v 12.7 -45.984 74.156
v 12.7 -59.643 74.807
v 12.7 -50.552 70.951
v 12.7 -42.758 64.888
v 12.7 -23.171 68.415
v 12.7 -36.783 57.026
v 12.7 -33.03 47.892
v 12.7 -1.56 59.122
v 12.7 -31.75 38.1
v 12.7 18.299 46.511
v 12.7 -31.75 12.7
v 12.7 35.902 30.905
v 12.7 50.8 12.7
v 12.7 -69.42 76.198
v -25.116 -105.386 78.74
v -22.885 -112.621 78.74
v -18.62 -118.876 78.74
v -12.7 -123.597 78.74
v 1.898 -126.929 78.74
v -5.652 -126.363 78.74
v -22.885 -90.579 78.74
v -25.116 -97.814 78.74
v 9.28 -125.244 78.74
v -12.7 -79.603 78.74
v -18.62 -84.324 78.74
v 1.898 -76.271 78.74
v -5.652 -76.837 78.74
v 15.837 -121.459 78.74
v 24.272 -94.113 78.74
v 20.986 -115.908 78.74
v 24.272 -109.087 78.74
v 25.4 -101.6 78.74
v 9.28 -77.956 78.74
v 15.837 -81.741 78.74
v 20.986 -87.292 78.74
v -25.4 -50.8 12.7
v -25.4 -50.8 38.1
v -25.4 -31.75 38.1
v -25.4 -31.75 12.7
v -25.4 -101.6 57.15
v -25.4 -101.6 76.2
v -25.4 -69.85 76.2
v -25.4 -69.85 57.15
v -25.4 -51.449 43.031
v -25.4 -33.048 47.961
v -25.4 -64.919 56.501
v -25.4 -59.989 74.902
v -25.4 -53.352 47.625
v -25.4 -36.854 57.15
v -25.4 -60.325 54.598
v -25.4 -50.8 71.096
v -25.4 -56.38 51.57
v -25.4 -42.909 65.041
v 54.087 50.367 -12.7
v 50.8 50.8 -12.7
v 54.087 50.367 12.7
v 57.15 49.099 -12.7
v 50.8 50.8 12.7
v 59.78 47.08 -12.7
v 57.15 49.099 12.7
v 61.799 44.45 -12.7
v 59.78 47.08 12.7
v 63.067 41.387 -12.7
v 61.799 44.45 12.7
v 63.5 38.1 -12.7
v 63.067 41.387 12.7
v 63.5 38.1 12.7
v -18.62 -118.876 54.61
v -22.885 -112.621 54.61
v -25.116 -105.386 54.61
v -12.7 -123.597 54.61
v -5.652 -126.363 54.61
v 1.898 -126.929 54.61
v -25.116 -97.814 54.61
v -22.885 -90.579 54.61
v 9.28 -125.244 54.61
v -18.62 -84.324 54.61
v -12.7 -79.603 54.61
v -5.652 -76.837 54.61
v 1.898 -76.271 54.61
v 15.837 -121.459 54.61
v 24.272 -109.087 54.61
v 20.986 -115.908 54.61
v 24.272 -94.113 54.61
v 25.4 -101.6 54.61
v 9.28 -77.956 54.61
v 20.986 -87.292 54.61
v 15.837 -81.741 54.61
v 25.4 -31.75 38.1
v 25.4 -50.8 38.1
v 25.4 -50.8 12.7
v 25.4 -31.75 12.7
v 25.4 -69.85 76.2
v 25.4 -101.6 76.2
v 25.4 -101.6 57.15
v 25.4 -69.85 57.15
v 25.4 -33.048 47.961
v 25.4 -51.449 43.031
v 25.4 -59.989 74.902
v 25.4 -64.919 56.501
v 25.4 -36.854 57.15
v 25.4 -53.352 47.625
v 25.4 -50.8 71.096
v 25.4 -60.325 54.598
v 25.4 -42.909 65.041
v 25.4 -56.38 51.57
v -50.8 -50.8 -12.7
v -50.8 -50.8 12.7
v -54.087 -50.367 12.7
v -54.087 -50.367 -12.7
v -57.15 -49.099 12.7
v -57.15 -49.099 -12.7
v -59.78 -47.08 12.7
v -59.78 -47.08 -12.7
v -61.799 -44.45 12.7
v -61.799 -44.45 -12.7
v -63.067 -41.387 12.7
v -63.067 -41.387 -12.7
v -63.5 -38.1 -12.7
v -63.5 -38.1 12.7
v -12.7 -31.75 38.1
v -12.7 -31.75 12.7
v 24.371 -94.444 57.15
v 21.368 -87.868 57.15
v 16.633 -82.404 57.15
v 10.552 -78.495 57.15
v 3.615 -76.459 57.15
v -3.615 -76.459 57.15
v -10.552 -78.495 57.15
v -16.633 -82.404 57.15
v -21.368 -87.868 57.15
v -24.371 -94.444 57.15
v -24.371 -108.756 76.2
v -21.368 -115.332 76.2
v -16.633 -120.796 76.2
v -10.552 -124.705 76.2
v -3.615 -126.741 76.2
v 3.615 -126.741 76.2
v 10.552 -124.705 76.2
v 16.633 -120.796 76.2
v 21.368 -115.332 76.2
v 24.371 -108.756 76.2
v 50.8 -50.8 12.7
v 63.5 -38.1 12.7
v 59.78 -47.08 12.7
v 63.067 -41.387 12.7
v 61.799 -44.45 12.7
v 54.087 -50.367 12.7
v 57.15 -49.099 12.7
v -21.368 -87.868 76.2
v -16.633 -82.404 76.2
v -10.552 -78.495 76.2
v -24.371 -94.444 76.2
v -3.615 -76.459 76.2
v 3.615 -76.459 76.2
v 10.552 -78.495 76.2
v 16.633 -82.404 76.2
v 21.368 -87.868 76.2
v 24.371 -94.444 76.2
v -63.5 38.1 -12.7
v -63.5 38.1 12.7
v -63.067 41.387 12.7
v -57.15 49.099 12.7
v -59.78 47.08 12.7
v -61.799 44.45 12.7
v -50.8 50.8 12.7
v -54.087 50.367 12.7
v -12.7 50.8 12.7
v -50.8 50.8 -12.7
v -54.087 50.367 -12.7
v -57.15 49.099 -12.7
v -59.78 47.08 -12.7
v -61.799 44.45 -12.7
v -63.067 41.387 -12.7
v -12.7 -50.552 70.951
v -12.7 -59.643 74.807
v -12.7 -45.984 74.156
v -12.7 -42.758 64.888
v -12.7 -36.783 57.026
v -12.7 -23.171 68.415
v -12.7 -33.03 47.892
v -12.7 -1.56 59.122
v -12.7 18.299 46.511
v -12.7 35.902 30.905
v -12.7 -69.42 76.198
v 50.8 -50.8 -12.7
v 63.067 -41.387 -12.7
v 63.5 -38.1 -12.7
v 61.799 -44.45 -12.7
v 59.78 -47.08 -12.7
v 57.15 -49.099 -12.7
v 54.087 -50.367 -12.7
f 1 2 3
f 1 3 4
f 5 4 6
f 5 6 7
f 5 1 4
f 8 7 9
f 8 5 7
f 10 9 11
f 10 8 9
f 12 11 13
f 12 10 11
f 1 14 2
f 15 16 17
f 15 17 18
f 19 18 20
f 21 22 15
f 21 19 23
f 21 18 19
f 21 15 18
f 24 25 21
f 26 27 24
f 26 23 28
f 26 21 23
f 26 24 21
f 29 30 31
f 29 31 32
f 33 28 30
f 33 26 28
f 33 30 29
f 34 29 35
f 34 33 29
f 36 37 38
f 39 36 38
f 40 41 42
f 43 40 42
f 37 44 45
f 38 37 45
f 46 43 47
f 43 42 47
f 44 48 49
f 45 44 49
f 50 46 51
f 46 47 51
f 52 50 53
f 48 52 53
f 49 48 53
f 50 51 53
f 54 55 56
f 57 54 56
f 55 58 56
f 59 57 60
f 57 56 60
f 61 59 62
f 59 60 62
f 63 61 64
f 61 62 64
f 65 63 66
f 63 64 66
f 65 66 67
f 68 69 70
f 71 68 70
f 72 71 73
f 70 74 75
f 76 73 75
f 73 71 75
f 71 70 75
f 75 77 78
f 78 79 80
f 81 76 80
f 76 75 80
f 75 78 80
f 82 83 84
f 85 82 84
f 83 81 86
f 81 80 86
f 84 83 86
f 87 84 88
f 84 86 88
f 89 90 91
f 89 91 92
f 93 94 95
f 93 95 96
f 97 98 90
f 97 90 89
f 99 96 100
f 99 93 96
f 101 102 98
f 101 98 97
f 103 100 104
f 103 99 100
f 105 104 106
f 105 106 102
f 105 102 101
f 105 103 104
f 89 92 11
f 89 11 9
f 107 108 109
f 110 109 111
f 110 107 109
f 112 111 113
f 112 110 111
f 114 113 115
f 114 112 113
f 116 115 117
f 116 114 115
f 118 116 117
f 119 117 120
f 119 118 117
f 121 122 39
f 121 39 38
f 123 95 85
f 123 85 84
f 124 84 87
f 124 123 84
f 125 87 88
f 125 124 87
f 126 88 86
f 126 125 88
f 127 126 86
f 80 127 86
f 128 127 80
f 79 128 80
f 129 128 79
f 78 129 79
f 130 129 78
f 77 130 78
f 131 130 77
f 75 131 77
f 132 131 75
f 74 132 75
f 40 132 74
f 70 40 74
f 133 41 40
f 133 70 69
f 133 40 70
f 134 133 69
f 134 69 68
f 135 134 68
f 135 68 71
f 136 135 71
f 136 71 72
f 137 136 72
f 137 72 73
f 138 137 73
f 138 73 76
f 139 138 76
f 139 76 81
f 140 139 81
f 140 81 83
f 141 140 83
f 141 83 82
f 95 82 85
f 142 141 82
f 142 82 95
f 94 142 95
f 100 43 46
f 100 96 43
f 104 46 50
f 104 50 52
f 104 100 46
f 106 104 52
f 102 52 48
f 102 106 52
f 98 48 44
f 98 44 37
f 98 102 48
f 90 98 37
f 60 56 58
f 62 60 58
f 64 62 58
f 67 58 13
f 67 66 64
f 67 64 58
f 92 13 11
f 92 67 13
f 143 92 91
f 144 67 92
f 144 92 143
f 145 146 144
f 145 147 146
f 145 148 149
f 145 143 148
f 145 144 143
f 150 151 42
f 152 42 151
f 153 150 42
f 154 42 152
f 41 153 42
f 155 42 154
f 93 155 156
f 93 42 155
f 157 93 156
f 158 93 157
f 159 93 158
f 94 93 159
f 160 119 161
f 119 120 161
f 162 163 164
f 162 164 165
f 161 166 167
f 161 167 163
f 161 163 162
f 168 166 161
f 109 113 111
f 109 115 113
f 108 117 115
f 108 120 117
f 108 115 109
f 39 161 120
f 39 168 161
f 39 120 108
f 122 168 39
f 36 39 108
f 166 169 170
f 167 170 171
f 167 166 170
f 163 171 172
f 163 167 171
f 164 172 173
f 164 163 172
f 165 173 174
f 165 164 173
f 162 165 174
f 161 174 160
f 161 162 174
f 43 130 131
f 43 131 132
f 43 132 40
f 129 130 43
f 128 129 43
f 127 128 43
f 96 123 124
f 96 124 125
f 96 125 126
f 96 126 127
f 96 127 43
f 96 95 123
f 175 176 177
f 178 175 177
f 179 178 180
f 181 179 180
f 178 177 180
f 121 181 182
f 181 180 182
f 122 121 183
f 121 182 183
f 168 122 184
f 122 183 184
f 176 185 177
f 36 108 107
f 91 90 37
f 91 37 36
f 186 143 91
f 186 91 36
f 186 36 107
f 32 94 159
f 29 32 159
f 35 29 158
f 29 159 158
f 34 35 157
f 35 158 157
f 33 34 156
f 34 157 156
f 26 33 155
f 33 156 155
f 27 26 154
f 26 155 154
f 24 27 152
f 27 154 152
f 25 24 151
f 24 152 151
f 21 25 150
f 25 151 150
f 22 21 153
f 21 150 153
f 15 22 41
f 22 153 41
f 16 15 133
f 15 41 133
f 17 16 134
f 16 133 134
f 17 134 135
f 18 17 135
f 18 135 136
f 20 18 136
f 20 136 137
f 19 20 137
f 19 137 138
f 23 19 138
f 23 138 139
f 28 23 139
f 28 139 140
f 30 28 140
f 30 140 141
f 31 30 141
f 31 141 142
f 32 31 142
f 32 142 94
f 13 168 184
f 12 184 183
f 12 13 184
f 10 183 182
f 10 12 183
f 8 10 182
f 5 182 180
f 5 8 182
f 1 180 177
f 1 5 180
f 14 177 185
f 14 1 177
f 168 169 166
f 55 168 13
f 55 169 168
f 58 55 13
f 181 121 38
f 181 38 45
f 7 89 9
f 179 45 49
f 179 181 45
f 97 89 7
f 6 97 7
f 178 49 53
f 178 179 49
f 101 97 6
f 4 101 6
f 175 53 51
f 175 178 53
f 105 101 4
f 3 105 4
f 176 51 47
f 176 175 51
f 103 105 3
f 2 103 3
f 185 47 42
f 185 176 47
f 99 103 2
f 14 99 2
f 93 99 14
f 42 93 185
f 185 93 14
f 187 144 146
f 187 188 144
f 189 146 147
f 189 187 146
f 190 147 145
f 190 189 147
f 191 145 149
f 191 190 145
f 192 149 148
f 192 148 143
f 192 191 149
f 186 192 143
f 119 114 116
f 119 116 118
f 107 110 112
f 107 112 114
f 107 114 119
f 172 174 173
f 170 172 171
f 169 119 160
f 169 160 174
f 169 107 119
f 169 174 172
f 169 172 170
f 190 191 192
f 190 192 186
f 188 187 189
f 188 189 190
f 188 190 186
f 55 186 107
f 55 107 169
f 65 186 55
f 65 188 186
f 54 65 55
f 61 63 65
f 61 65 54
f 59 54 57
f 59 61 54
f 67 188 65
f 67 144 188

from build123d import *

# Parameters (mm, degrees)
F1_DEPTH      = 25.4
F1_DEPTH_BACK = 25.4
F2_DEPTH      = 63.5
F2_DEPTH_BACK = 63.5
F4_DEPTH      = 2.54
F4_DEPTH_BACK = 21.59
F6_DEPTH      = 12.7
F6_DEPTH_BACK = 12.7
F7_R          = 12.7


with BuildPart() as f1:
    # F0 (on Right) → F1 (new body, two sides)
    with BuildSketch(Plane.YZ) as f1_sk:
        with BuildLine():
            Line((-50.8, 38.1), (-50.8, 12.7))
            Line((-50.8, 12.7), (-31.75, 12.7))
            Line((-31.75, 12.7), (-31.75, 38.1))
            ThreePointArc((-31.75, 38.1), (-42.9092316368, 65.0407683632), (-69.85, 76.2))
            Line((-69.85, 76.2), (-101.6, 76.2))
            Line((-101.6, 76.2), (-101.6, 57.15))
            Line((-101.6, 57.15), (-69.85, 57.15))
            ThreePointArc((-69.85, 57.15), (-56.3796158184, 51.5703841816), (-50.8, 38.1))
        make_face()
    extrude(amount=F1_DEPTH)
    extrude(f1_sk.sketch, amount=-F1_DEPTH_BACK)

    # F0 (on Right) → F2 (join, two sides)
    with BuildSketch(Plane.YZ) as f2_sk:
        Polygon((-50.8, 12.7), (-50.8, -12.7), (50.8, -12.7), (50.8, 12.7), (-31.75, 12.7), align=None)
    extrude(amount=F2_DEPTH)
    extrude(f2_sk.sketch, amount=-F2_DEPTH_BACK)

    # F3 (on face) → F4 (join, two sides)
    with BuildSketch(Plane.XY.offset(76.2)) as f4_sk:
        with BuildLine():
            ThreePointArc((-25.4, -101.6), (0, -127), (25.4, -101.6))
            Line((25.4, -101.6), (-25.4, -101.6))
        make_face()
        with BuildLine():
            Line((-25.4, -101.6), (25.4, -101.6))
            ThreePointArc((25.4, -101.6), (0, -76.2), (-25.4, -101.6))
        make_face()
    extrude(amount=F4_DEPTH)
    extrude(f4_sk.sketch, amount=-F4_DEPTH_BACK)

    # F5 (on Right) → F6 (join, two sides)
    with BuildSketch(Plane.YZ) as f6_sk:
        with BuildLine():
            Line((-31.75, 12.7), (50.8, 12.7))
            ThreePointArc((50.8, 12.7), (-1.5601227987, 59.1215530154), (-69.4199238636, 76.1975725541))
            ThreePointArc((-69.4199238636, 76.1975725541), (-42.7576034578, 64.8882819457), (-31.75, 38.1))
            Line((-31.75, 38.1), (-31.75, 12.7))
        make_face()
    extrude(amount=F6_DEPTH)
    extrude(f6_sk.sketch, amount=-F6_DEPTH_BACK)

    # F7
    f7_edges = [f1.edges().sort_by_distance(p)[0] for p in [
        (-63.5, 50.8, 0),
        (-63.5, -50.8, 0),
        (63.5, -50.8, 0),
        (63.5, 50.8, 0),
    ]]
    fillet(f7_edges, radius=F7_R)


solid = f1.part
